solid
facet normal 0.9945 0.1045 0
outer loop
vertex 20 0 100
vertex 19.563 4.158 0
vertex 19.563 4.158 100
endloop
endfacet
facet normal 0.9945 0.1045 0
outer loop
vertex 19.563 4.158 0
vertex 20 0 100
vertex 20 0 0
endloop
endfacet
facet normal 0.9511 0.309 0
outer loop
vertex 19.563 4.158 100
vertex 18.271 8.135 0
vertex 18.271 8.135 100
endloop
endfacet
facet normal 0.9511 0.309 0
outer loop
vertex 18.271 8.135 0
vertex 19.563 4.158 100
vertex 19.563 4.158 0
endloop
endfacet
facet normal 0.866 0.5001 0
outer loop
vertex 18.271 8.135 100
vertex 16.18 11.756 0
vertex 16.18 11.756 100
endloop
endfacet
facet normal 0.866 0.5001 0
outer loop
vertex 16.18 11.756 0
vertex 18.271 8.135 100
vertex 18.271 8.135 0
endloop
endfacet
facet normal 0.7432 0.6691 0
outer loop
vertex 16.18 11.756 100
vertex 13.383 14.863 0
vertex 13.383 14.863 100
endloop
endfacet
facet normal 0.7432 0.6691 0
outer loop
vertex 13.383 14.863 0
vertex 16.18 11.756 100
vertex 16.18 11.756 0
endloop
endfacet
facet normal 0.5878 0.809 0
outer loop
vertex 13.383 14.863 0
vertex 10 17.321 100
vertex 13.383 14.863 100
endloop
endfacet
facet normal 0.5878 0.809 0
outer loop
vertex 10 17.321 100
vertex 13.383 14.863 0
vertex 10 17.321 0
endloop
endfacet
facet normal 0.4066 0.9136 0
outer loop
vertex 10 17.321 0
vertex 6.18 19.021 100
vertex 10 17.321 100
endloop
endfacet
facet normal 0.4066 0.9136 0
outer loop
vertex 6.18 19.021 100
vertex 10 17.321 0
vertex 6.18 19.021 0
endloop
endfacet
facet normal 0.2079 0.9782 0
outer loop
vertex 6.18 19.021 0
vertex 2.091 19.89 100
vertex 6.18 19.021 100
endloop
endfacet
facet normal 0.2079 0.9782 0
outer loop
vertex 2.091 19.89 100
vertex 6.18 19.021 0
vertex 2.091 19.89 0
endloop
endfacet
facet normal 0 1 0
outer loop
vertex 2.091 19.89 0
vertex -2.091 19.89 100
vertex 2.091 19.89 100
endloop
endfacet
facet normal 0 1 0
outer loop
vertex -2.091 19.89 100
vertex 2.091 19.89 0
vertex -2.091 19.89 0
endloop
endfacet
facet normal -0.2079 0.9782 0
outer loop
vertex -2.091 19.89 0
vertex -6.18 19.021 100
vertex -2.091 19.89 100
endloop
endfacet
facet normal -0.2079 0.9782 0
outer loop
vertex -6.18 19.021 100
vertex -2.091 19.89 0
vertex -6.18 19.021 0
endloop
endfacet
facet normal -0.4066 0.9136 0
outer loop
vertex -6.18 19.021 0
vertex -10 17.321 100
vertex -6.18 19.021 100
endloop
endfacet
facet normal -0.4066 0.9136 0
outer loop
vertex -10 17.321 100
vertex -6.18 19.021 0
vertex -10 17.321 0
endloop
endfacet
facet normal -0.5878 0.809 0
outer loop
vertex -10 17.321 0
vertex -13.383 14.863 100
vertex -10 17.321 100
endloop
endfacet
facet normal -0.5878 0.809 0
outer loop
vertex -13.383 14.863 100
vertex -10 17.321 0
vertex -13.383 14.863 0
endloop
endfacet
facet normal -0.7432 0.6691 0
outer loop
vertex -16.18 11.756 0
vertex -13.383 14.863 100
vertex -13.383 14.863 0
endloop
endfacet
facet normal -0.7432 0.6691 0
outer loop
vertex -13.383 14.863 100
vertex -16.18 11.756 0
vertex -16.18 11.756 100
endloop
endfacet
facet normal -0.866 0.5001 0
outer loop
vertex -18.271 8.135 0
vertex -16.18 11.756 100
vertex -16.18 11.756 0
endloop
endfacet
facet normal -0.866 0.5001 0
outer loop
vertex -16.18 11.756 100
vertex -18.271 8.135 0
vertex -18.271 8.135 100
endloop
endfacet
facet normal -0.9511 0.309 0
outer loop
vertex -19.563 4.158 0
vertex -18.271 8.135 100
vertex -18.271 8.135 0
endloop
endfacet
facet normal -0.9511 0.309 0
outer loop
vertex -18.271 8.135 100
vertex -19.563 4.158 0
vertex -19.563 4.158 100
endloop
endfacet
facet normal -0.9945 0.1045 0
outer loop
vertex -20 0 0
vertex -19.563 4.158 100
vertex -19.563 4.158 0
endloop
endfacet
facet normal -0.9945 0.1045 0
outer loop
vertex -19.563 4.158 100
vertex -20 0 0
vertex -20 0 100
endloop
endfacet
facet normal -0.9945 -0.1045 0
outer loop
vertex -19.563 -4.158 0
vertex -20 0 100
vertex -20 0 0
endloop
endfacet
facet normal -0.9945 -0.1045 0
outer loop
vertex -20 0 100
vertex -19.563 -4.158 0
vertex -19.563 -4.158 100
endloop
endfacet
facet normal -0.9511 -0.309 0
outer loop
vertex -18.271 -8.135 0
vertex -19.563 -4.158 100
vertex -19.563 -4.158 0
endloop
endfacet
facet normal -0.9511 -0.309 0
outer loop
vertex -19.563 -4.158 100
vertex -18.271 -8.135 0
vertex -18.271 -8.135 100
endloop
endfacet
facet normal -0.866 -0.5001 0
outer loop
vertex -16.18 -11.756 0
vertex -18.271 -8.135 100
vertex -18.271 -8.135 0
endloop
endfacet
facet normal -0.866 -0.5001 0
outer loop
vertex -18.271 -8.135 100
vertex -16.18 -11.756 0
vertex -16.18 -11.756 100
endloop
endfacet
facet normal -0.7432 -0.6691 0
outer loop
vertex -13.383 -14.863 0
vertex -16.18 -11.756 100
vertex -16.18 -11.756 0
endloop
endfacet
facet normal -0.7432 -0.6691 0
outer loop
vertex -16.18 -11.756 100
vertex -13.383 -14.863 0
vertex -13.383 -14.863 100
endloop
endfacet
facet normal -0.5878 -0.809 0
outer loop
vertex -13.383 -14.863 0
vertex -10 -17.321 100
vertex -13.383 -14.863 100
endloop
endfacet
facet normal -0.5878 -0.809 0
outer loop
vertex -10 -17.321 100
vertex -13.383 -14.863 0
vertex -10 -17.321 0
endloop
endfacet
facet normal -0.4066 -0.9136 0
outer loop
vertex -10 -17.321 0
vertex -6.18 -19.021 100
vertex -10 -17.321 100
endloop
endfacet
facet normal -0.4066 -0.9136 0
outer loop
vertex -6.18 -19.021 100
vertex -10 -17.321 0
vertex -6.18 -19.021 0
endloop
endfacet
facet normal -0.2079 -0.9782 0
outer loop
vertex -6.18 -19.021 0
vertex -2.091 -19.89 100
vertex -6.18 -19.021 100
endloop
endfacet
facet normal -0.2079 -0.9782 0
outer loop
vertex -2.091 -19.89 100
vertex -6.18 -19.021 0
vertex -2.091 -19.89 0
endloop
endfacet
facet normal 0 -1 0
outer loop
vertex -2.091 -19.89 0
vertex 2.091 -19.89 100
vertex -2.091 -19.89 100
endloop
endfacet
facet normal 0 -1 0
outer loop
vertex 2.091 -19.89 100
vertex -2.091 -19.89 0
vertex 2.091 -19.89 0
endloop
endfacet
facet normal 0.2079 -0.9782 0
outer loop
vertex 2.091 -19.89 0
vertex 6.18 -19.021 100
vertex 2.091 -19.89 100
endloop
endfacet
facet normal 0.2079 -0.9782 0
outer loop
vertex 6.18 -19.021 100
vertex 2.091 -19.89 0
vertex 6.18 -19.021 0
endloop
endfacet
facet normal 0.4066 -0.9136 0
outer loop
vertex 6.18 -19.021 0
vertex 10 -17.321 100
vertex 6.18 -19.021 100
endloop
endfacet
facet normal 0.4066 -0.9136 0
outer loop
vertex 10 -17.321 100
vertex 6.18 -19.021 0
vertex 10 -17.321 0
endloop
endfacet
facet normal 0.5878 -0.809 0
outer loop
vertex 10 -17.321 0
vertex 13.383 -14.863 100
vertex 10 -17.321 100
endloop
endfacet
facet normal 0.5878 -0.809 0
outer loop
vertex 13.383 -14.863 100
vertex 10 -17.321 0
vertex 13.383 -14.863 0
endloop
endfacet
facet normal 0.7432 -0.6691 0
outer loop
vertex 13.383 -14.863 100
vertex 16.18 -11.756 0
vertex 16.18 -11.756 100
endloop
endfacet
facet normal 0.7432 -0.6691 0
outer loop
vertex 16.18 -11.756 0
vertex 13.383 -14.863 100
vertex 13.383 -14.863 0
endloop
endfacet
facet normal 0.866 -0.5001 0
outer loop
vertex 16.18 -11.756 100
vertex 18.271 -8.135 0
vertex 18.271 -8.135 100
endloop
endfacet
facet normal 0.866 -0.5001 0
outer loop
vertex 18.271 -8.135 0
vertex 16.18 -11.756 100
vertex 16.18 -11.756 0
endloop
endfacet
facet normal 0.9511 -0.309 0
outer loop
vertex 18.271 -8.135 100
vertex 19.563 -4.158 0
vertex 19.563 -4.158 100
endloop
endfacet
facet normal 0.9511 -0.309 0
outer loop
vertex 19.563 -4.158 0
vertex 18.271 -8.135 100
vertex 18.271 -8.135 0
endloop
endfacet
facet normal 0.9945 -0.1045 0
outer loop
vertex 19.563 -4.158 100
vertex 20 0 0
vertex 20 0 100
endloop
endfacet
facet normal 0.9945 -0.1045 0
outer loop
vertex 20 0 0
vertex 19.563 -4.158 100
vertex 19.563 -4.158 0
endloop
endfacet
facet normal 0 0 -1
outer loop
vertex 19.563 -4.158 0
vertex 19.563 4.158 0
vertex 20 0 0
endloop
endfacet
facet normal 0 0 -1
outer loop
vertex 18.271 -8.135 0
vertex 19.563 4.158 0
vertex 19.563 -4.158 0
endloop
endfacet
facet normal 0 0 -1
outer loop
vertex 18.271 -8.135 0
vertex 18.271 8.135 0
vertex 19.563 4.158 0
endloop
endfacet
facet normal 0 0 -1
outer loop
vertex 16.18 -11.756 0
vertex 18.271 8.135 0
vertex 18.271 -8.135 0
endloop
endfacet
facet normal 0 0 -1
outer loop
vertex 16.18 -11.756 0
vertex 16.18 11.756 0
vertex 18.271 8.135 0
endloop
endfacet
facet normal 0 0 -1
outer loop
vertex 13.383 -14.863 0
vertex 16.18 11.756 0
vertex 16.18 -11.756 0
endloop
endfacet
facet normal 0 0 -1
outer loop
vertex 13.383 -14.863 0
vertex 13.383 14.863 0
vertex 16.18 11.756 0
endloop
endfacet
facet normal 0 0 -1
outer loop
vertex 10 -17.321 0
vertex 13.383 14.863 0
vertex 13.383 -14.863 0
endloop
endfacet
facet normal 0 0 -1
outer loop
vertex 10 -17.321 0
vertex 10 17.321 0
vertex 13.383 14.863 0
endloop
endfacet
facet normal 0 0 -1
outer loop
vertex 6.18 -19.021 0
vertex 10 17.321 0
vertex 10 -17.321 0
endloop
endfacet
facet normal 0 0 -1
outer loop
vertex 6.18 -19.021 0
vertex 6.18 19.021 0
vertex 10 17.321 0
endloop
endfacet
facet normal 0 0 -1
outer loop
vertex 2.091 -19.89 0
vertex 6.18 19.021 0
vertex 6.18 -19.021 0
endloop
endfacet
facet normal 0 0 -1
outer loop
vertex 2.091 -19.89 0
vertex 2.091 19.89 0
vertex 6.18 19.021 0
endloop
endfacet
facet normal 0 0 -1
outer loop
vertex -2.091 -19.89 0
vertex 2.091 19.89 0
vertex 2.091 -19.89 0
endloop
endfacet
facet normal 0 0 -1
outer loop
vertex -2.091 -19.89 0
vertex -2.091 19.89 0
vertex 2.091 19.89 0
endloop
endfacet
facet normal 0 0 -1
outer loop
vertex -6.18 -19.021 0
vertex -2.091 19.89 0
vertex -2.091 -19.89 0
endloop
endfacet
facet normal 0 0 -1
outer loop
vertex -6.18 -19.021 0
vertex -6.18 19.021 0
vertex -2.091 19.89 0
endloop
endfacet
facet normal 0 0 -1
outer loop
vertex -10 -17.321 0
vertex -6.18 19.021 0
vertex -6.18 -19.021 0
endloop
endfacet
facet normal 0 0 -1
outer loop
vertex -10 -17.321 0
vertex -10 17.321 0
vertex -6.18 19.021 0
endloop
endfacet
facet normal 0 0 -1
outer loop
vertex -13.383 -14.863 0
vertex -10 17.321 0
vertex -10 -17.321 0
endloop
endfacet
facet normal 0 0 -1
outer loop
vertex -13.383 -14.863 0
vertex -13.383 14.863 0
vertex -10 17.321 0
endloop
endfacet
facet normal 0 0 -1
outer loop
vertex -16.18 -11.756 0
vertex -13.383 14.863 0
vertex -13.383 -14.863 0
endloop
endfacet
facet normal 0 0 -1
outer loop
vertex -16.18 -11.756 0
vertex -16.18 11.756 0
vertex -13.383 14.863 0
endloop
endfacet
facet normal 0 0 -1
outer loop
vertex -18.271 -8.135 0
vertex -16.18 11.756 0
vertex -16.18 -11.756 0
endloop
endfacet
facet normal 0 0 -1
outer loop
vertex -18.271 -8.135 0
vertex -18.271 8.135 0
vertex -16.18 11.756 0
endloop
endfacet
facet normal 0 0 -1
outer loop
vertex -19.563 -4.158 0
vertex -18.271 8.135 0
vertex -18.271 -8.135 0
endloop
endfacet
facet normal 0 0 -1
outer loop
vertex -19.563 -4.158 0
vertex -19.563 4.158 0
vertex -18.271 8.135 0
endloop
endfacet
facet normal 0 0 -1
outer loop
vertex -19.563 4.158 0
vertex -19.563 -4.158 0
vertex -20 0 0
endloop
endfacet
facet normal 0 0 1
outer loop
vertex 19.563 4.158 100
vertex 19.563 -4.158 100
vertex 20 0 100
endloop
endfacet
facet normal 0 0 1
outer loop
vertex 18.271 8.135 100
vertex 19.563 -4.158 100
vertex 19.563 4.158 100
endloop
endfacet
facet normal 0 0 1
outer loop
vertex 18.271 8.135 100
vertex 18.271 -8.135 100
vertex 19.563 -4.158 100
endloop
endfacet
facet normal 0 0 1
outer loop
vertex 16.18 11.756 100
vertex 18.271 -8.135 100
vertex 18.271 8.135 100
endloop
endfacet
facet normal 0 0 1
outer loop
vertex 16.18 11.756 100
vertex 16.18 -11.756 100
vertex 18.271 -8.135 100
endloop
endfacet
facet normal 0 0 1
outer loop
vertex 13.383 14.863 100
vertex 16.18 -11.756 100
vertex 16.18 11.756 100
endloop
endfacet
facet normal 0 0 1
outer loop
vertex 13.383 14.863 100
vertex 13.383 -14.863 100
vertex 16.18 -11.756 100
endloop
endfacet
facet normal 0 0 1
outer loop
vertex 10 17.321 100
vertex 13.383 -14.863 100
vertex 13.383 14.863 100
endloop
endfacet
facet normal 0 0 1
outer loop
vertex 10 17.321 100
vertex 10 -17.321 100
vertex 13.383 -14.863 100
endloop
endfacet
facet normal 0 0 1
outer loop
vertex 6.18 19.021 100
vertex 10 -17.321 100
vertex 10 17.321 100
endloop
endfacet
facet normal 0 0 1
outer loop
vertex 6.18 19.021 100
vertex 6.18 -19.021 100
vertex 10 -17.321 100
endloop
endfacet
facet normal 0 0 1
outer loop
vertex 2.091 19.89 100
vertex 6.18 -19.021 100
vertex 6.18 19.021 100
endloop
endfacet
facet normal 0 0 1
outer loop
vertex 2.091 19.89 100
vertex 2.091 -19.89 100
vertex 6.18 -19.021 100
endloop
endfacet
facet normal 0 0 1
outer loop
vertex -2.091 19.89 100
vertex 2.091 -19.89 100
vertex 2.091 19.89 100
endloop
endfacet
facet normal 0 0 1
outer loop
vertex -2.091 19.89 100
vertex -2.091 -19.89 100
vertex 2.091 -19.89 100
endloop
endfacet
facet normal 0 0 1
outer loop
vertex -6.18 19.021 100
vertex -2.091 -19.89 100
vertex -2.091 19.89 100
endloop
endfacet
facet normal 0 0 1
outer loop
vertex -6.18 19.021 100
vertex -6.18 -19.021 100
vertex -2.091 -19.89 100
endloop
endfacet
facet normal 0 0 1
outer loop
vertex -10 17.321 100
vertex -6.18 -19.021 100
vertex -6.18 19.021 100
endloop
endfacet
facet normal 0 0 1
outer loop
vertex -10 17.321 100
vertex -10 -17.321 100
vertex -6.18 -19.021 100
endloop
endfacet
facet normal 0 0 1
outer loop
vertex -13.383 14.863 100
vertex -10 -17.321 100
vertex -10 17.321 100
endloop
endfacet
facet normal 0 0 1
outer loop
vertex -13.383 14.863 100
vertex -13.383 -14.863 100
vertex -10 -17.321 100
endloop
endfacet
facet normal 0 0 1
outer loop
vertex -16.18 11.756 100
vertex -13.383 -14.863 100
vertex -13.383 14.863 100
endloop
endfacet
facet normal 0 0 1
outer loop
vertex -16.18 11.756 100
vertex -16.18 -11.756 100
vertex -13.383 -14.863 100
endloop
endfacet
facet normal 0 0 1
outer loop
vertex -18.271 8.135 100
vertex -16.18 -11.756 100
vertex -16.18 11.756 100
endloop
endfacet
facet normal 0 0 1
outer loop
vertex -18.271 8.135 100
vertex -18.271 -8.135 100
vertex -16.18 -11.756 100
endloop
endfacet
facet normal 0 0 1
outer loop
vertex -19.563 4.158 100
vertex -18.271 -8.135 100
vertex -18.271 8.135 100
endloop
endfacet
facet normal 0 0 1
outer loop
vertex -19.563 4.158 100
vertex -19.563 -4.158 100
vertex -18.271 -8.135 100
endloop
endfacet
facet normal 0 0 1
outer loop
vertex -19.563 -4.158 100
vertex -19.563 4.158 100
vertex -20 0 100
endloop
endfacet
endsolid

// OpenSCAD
// Unit of length: Unit.INCH
cylinder(h = 100.0, r = 20.0, center = false, $fa = 12.0, $fs = 2.0, $fn = 0);
